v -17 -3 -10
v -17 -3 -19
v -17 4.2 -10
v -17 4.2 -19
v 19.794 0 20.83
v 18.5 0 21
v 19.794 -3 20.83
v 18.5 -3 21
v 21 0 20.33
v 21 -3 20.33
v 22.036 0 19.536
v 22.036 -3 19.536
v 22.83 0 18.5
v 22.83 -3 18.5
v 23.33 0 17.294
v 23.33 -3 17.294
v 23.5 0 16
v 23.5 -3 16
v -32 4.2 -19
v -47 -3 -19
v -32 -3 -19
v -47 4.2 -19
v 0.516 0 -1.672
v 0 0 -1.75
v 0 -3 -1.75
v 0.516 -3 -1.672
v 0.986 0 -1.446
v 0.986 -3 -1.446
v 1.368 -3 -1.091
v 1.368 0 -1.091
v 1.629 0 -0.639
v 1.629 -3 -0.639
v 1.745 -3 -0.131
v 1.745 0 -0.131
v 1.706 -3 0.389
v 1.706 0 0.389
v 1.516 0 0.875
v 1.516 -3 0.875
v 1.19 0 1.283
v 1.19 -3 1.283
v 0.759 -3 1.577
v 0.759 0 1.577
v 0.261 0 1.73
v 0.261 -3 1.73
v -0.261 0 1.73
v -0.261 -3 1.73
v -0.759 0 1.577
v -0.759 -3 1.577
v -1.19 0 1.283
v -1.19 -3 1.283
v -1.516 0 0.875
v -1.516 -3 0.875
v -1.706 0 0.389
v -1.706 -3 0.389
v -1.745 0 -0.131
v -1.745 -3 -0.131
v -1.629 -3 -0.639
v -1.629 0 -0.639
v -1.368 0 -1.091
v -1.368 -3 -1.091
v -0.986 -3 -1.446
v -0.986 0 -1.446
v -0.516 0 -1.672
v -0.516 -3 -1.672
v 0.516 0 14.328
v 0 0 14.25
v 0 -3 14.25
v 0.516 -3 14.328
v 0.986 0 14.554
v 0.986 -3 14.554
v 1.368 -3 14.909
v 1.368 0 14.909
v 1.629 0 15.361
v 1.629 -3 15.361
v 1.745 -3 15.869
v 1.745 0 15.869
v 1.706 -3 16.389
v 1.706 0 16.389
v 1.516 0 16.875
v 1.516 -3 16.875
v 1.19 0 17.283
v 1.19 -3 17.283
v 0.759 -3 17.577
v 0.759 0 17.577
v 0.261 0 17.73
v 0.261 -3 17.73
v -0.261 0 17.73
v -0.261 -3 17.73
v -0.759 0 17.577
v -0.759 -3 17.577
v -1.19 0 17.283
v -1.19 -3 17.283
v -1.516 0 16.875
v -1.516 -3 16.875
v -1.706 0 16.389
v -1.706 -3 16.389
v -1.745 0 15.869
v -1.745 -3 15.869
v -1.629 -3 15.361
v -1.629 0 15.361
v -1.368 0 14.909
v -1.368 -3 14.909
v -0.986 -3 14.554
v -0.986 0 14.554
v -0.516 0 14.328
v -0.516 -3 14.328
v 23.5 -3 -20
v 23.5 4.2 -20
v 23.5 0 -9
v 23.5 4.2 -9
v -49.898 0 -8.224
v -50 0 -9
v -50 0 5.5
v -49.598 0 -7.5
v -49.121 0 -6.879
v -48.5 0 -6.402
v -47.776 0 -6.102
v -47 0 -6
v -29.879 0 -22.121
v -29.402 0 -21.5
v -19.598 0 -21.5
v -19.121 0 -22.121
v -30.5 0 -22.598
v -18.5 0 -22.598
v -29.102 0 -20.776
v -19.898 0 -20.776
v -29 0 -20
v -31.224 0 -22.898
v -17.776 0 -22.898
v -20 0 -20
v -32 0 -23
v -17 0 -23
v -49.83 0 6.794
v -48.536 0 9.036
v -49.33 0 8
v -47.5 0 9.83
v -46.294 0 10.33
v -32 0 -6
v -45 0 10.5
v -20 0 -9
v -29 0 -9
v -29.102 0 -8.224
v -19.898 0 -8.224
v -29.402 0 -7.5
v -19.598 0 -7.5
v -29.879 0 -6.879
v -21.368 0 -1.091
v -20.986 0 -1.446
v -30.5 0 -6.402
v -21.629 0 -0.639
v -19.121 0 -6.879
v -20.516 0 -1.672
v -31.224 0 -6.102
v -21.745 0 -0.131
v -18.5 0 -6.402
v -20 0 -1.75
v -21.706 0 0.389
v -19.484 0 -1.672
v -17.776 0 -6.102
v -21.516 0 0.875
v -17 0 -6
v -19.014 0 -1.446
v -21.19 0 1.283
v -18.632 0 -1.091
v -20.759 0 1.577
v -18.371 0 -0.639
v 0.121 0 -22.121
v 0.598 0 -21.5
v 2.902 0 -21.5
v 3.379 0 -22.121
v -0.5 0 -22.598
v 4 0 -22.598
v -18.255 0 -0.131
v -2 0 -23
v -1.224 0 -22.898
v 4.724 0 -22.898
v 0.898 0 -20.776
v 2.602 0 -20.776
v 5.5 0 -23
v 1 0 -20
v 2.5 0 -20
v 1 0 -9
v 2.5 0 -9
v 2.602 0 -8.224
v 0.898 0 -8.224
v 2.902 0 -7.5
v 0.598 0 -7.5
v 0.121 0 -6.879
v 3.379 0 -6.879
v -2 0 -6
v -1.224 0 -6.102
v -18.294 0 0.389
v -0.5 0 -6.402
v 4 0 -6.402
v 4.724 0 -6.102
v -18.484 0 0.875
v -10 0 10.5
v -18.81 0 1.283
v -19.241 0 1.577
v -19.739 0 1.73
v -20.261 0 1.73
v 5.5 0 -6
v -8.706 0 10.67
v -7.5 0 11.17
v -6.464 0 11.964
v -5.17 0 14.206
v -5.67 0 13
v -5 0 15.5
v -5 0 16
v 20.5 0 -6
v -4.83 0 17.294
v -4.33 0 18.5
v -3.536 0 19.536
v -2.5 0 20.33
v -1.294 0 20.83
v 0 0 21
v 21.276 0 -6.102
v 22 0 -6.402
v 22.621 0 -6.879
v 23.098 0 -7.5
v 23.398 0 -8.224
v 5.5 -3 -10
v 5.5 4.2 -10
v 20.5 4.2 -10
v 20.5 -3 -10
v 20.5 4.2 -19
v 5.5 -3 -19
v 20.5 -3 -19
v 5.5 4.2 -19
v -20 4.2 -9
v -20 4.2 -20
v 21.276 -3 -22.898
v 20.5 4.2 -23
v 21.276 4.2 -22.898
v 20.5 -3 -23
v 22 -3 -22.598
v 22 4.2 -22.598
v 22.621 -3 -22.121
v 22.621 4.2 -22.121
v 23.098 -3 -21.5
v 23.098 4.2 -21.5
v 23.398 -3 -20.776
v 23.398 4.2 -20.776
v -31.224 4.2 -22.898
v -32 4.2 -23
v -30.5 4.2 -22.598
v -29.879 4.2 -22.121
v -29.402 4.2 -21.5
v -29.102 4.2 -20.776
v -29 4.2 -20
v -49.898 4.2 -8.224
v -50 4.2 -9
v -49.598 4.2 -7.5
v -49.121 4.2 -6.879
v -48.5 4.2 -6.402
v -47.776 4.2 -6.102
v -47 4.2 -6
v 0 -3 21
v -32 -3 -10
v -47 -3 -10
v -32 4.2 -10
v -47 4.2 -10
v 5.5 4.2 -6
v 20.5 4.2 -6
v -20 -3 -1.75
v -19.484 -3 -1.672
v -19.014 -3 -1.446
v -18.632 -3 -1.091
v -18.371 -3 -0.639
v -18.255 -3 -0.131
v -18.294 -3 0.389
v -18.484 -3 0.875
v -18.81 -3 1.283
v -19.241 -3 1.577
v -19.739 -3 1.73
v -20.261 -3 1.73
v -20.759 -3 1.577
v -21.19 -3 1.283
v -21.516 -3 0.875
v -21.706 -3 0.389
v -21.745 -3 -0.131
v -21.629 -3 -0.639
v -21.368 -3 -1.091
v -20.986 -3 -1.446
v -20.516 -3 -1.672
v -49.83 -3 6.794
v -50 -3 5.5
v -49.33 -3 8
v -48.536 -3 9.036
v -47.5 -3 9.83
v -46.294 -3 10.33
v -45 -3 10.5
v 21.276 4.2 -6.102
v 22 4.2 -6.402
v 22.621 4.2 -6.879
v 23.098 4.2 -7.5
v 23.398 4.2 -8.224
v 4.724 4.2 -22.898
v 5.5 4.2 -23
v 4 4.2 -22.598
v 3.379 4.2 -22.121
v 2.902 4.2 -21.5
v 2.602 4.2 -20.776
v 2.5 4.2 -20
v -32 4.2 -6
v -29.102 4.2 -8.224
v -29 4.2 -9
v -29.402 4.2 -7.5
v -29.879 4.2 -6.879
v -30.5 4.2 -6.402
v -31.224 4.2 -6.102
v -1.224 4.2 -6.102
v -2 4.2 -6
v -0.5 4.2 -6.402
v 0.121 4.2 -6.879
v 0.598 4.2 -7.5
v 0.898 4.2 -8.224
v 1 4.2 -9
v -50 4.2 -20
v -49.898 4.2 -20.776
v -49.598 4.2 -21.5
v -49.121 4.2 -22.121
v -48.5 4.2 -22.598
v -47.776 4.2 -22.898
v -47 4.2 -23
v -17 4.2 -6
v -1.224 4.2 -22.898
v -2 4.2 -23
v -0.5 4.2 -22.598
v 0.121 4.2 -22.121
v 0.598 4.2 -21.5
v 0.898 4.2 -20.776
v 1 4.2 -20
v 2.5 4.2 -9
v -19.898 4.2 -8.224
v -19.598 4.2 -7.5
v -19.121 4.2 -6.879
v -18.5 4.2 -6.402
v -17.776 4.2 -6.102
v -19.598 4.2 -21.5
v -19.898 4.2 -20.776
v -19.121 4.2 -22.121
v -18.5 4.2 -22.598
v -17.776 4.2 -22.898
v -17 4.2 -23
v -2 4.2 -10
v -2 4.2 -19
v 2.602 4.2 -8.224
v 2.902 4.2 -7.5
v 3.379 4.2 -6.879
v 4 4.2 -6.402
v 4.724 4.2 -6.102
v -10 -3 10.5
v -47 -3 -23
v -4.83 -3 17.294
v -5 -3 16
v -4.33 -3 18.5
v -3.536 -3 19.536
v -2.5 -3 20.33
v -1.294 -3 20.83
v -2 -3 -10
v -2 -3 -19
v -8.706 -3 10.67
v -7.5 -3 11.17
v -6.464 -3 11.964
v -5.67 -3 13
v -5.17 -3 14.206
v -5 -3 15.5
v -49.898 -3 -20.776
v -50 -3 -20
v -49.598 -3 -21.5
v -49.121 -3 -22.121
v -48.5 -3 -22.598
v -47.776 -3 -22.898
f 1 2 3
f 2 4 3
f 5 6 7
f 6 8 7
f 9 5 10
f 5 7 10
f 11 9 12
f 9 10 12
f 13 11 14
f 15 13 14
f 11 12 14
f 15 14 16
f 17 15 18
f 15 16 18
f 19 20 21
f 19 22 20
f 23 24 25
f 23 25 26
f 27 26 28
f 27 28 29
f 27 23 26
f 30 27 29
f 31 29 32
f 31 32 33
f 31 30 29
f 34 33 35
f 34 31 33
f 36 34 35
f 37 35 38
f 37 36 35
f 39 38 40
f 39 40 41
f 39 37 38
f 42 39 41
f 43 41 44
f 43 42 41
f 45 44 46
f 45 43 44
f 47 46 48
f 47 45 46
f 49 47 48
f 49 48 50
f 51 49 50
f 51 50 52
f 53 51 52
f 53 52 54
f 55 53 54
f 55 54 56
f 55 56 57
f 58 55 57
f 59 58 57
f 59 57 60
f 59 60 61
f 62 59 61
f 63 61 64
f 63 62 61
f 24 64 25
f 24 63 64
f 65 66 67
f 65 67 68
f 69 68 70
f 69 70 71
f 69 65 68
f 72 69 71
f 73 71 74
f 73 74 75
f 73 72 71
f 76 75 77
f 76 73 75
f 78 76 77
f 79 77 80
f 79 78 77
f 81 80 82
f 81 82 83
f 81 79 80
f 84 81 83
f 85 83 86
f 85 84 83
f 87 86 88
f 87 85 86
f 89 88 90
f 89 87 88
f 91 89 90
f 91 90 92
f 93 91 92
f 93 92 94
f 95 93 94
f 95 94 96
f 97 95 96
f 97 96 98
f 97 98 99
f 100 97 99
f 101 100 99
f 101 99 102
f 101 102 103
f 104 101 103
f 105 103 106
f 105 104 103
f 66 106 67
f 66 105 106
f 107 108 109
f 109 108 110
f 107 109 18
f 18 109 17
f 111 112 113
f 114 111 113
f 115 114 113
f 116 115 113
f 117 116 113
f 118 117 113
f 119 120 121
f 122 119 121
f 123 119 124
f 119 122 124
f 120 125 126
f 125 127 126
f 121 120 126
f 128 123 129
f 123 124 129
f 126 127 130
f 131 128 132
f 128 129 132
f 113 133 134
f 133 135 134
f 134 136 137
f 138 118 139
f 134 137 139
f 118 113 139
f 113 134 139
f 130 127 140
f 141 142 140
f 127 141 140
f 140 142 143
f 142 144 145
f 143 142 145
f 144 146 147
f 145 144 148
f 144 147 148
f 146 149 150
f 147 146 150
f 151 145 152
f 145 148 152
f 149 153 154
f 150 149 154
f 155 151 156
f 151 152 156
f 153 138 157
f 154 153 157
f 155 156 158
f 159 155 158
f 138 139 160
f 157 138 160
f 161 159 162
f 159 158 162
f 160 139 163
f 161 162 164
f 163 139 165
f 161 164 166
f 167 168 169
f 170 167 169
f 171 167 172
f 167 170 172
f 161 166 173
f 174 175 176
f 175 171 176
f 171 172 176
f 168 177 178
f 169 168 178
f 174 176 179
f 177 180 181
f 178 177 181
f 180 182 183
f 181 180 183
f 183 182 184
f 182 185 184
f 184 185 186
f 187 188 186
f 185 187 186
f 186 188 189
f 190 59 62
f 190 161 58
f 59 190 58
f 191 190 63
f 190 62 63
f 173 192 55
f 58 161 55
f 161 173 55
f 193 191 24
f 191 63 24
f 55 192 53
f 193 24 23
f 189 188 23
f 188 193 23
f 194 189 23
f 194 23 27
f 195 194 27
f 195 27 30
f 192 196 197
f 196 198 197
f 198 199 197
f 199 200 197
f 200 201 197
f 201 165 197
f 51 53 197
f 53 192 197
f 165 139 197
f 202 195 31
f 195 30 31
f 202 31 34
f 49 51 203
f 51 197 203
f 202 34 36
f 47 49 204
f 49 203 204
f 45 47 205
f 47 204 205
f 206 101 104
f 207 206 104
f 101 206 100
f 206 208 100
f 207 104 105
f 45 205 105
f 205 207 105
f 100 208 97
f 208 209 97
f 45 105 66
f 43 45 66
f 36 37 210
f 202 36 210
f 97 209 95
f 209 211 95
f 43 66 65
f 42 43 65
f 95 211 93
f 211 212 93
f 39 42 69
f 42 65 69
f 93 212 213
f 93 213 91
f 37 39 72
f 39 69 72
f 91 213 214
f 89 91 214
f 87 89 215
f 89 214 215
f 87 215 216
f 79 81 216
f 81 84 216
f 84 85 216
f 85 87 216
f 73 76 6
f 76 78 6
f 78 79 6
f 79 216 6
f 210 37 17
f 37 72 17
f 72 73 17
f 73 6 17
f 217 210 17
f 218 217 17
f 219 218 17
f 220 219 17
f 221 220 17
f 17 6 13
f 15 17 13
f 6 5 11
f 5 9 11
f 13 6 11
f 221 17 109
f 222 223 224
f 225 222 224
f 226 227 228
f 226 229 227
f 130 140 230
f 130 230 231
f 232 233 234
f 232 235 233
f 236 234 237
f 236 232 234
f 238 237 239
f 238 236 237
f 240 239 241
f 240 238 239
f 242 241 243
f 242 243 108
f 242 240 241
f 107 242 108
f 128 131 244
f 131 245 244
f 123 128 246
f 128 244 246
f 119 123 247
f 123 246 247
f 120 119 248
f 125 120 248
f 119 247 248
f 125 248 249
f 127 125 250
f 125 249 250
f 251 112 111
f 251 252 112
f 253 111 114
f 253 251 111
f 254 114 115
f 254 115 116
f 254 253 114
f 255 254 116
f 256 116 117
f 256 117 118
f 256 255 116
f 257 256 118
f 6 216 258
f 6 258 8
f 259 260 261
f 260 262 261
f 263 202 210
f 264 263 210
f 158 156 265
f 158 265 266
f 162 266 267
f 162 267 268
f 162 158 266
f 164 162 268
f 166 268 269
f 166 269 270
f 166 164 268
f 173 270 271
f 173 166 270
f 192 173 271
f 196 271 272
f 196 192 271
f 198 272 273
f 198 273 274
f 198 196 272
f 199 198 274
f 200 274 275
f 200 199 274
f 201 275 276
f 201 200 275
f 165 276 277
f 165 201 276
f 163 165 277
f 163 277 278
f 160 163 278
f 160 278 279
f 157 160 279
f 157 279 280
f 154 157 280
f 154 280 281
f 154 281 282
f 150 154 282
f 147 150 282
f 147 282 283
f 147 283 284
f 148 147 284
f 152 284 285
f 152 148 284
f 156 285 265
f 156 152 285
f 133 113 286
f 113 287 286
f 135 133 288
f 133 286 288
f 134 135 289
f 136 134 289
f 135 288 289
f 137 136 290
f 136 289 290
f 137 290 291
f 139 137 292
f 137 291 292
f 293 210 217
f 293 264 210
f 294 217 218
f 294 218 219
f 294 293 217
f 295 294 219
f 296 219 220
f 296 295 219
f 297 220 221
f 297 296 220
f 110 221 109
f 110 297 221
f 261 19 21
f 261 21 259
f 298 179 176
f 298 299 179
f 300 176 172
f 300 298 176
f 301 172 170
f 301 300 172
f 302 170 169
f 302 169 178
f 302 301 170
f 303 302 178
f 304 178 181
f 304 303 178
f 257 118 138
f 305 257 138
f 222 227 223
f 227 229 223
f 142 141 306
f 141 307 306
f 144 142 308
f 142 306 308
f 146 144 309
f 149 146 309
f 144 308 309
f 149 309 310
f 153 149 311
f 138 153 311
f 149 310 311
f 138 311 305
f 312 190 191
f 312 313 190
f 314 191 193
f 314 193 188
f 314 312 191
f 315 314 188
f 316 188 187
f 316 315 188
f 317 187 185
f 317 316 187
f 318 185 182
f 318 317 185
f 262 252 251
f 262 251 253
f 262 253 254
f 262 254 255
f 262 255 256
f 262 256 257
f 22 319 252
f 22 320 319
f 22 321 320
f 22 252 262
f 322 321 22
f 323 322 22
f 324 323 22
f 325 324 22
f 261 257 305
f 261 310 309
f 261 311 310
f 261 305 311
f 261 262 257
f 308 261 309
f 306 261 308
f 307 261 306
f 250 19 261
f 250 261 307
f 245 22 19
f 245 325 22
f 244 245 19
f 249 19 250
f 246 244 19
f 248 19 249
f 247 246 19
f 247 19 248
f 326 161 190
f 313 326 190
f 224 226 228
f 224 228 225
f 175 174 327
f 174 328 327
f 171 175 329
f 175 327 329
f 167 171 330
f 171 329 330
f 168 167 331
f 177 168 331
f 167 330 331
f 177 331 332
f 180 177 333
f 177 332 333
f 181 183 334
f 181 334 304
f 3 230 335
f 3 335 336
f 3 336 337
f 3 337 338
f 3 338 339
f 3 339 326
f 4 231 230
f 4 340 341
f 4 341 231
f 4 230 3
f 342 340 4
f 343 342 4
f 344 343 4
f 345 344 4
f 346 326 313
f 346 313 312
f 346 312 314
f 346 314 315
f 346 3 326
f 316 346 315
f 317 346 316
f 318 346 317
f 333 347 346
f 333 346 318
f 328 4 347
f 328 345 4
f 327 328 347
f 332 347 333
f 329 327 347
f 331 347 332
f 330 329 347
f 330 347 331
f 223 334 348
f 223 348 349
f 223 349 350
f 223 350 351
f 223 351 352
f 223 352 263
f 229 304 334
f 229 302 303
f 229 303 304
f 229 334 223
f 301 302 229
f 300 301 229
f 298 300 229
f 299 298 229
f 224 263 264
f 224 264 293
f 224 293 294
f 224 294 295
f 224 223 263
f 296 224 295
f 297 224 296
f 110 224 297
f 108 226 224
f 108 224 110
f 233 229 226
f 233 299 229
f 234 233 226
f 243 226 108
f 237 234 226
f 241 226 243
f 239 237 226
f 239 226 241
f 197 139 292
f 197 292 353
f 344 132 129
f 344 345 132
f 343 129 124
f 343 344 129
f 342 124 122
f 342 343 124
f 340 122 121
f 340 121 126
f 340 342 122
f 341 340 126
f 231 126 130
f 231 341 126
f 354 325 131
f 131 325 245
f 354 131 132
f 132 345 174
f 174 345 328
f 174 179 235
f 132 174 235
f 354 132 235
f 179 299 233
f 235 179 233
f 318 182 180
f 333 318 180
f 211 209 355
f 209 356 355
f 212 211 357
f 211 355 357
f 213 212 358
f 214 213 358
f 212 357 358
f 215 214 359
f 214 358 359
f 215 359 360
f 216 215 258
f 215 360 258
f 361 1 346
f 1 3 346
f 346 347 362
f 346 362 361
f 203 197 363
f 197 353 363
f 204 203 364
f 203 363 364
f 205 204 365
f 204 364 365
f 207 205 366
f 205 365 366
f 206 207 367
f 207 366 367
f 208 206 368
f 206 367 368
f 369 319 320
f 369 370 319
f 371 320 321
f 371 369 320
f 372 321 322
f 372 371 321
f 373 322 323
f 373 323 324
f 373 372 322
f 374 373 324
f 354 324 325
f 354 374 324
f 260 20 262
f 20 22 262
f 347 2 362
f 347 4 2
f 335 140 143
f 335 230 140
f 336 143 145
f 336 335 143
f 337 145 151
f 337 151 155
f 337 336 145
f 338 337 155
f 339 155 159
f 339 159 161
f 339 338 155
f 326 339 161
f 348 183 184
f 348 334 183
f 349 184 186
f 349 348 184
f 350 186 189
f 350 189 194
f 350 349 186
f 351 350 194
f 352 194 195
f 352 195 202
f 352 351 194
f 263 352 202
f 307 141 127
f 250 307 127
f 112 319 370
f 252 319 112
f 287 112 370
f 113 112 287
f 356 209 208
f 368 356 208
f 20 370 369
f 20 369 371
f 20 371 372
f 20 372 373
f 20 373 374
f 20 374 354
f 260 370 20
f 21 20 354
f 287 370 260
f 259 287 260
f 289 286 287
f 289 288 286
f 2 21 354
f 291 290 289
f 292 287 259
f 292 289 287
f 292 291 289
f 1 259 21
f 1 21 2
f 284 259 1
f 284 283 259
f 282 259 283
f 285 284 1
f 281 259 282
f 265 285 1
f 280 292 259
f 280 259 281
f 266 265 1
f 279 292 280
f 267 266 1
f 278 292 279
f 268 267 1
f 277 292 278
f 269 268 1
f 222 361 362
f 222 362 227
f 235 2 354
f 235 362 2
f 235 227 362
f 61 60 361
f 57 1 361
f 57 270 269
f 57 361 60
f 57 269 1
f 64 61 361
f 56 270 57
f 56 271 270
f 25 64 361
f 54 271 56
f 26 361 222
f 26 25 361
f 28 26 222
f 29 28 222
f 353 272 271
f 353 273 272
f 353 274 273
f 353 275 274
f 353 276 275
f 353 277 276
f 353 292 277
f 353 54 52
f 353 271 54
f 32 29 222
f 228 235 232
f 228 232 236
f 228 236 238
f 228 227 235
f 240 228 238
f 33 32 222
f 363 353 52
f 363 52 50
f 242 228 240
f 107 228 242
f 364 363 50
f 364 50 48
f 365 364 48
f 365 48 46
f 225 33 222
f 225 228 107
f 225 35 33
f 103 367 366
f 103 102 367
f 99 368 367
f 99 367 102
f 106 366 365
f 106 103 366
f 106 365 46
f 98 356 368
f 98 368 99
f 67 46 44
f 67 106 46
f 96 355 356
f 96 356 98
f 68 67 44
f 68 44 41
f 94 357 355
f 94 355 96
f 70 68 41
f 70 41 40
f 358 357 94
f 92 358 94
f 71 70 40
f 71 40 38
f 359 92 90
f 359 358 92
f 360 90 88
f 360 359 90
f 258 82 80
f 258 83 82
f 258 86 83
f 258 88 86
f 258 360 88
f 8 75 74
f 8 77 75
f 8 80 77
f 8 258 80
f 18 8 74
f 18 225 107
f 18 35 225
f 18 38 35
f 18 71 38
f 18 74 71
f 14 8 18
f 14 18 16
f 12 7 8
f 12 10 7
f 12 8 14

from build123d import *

# Parameters (mm, degrees)
SKETCH_1_W          = 21
SKETCH_1_H          = 17
SKETCH_1_W_2        = 15
SKETCH_1_H_2        = 9
EXTRUDE_1_DEPTH     = 4.2
EXTRUDE_1_2_DEPTH   = 4.2
EXTRUDE_1_3_DEPTH   = 4.2
SKETCH_2_W          = 73.5
SKETCH_2_H          = 44
SKETCH_2_R          = 1.75
SKETCH_2_W_2        = 15
SKETCH_2_H_2        = 9
EXTRUDE_2_DEPTH     = 3
FILLET_1_R          = 3
SKETCH_3_W          = 45
SKETCH_3_H          = 10.5
CUT_EXTRUDE_1_DEPTH = 56.196376693
FILLET_2_R          = 5


with BuildPart() as part:
    # 草图1 → 凸台-拉伸1 (new body)
    with BuildSketch(Plane(origin=(0, 0, 0), x_dir=(1, 0, 0), z_dir=(0, 1, 0))):
        with Locations((13, 14.5)):
            Rectangle(SKETCH_1_W, SKETCH_1_H)
        with Locations((13, 14.5)):
            Rectangle(SKETCH_1_W_2, SKETCH_1_H_2, mode=Mode.SUBTRACT)
    extrude(amount=EXTRUDE_1_DEPTH)



with BuildPart() as body_2:
    # 草图1 → Extrude 1 2 (new body)
    with BuildSketch(Plane(origin=(0, 0, 0), x_dir=(1, 0, 0), z_dir=(0, 1, 0))):
        with Locations((-9.5, 14.5)):
            Rectangle(SKETCH_1_W, SKETCH_1_H)
        with Locations((-9.5, 14.5)):
            Rectangle(SKETCH_1_W_2, SKETCH_1_H_2, mode=Mode.SUBTRACT)
    extrude(amount=EXTRUDE_1_2_DEPTH)


with BuildPart() as body_3:
    # 草图1 → Extrude 1 3 (new body)
    with BuildSketch(Plane(origin=(0, 0, 0), x_dir=(1, 0, 0), z_dir=(0, 1, 0))):
        with Locations((-39.5, 14.5)):
            Rectangle(SKETCH_1_W, SKETCH_1_H)
        with Locations((-39.5, 14.5)):
            Rectangle(SKETCH_1_W_2, SKETCH_1_H_2, mode=Mode.SUBTRACT)
    extrude(amount=EXTRUDE_1_3_DEPTH)


with BuildPart() as part_1:
    add(part.part)

    add(body_2.part)  # 凸台-拉伸2 merges body 2

    add(body_3.part)  # 凸台-拉伸2 merges body 3
    # 草图2 → 凸台-拉伸2 (add)
    with BuildSketch(Plane.XZ):
        with Locations((-13.25, -1)):
            Rectangle(SKETCH_2_W, SKETCH_2_H)
        with Locations(Location((0, 0, 0), (0, 0, 270))):
            Circle(SKETCH_2_R, mode=Mode.SUBTRACT)
        with Locations(Location((0, 16, 0), (0, 0, 270))):
            Circle(SKETCH_2_R, mode=Mode.SUBTRACT)
        with Locations(Location((-20, 0, 0), (0, 0, 270))):
            Circle(SKETCH_2_R, mode=Mode.SUBTRACT)
        with Locations((-39.5, -14.5)):
            Rectangle(SKETCH_2_W_2, SKETCH_2_H_2, mode=Mode.SUBTRACT)
        with Locations((-9.5, -14.5)):
            Rectangle(SKETCH_2_W_2, SKETCH_2_H_2, mode=Mode.SUBTRACT)
        with Locations((13, -14.5)):
            Rectangle(SKETCH_2_W_2, SKETCH_2_H_2, mode=Mode.SUBTRACT)
    extrude(amount=EXTRUDE_2_DEPTH)

    # 圆角1
    fillet_1_edges = [part_1.edges().sort_by_distance(p)[0] for p in [
        (1, 2.1, -23),
        (-20, 2.1, -23),
        (-20, 2.1, -6),
        (1, 2.1, -6),
        (-29, 2.1, -23),
        (-50, 2.1, -6),
        (-29, 2.1, -6),
        (-50, 0.6, -23),
        (23.5, 2.1, -6),
        (2.5, 2.1, -6),
        (2.5, 2.1, -23),
        (23.5, 0.6, -23),
    ]]
    fillet(fillet_1_edges, radius=FILLET_1_R)

    # 草图3 → 切除-拉伸1 (cut, through all)
    with BuildSketch(Plane(origin=(0, 0, 0), x_dir=(1, 0, 0), z_dir=(0, 1, 0))):
        with Locations((-27.5, -15.75)):
            Rectangle(SKETCH_3_W, SKETCH_3_H)
    extrude(amount=-CUT_EXTRUDE_1_DEPTH, mode=Mode.SUBTRACT)

    # 圆角2
    fillet_2_edges = [part_1.edges().sort_by_distance(p)[0] for p in [
        (-50, -1.5, 10.5),
        (-5, -1.5, 10.5),
        (-5, -1.5, 21),
        (23.5, -1.5, 21),
    ]]
    fillet(fillet_2_edges, radius=FILLET_2_R)


solid = part_1.part
